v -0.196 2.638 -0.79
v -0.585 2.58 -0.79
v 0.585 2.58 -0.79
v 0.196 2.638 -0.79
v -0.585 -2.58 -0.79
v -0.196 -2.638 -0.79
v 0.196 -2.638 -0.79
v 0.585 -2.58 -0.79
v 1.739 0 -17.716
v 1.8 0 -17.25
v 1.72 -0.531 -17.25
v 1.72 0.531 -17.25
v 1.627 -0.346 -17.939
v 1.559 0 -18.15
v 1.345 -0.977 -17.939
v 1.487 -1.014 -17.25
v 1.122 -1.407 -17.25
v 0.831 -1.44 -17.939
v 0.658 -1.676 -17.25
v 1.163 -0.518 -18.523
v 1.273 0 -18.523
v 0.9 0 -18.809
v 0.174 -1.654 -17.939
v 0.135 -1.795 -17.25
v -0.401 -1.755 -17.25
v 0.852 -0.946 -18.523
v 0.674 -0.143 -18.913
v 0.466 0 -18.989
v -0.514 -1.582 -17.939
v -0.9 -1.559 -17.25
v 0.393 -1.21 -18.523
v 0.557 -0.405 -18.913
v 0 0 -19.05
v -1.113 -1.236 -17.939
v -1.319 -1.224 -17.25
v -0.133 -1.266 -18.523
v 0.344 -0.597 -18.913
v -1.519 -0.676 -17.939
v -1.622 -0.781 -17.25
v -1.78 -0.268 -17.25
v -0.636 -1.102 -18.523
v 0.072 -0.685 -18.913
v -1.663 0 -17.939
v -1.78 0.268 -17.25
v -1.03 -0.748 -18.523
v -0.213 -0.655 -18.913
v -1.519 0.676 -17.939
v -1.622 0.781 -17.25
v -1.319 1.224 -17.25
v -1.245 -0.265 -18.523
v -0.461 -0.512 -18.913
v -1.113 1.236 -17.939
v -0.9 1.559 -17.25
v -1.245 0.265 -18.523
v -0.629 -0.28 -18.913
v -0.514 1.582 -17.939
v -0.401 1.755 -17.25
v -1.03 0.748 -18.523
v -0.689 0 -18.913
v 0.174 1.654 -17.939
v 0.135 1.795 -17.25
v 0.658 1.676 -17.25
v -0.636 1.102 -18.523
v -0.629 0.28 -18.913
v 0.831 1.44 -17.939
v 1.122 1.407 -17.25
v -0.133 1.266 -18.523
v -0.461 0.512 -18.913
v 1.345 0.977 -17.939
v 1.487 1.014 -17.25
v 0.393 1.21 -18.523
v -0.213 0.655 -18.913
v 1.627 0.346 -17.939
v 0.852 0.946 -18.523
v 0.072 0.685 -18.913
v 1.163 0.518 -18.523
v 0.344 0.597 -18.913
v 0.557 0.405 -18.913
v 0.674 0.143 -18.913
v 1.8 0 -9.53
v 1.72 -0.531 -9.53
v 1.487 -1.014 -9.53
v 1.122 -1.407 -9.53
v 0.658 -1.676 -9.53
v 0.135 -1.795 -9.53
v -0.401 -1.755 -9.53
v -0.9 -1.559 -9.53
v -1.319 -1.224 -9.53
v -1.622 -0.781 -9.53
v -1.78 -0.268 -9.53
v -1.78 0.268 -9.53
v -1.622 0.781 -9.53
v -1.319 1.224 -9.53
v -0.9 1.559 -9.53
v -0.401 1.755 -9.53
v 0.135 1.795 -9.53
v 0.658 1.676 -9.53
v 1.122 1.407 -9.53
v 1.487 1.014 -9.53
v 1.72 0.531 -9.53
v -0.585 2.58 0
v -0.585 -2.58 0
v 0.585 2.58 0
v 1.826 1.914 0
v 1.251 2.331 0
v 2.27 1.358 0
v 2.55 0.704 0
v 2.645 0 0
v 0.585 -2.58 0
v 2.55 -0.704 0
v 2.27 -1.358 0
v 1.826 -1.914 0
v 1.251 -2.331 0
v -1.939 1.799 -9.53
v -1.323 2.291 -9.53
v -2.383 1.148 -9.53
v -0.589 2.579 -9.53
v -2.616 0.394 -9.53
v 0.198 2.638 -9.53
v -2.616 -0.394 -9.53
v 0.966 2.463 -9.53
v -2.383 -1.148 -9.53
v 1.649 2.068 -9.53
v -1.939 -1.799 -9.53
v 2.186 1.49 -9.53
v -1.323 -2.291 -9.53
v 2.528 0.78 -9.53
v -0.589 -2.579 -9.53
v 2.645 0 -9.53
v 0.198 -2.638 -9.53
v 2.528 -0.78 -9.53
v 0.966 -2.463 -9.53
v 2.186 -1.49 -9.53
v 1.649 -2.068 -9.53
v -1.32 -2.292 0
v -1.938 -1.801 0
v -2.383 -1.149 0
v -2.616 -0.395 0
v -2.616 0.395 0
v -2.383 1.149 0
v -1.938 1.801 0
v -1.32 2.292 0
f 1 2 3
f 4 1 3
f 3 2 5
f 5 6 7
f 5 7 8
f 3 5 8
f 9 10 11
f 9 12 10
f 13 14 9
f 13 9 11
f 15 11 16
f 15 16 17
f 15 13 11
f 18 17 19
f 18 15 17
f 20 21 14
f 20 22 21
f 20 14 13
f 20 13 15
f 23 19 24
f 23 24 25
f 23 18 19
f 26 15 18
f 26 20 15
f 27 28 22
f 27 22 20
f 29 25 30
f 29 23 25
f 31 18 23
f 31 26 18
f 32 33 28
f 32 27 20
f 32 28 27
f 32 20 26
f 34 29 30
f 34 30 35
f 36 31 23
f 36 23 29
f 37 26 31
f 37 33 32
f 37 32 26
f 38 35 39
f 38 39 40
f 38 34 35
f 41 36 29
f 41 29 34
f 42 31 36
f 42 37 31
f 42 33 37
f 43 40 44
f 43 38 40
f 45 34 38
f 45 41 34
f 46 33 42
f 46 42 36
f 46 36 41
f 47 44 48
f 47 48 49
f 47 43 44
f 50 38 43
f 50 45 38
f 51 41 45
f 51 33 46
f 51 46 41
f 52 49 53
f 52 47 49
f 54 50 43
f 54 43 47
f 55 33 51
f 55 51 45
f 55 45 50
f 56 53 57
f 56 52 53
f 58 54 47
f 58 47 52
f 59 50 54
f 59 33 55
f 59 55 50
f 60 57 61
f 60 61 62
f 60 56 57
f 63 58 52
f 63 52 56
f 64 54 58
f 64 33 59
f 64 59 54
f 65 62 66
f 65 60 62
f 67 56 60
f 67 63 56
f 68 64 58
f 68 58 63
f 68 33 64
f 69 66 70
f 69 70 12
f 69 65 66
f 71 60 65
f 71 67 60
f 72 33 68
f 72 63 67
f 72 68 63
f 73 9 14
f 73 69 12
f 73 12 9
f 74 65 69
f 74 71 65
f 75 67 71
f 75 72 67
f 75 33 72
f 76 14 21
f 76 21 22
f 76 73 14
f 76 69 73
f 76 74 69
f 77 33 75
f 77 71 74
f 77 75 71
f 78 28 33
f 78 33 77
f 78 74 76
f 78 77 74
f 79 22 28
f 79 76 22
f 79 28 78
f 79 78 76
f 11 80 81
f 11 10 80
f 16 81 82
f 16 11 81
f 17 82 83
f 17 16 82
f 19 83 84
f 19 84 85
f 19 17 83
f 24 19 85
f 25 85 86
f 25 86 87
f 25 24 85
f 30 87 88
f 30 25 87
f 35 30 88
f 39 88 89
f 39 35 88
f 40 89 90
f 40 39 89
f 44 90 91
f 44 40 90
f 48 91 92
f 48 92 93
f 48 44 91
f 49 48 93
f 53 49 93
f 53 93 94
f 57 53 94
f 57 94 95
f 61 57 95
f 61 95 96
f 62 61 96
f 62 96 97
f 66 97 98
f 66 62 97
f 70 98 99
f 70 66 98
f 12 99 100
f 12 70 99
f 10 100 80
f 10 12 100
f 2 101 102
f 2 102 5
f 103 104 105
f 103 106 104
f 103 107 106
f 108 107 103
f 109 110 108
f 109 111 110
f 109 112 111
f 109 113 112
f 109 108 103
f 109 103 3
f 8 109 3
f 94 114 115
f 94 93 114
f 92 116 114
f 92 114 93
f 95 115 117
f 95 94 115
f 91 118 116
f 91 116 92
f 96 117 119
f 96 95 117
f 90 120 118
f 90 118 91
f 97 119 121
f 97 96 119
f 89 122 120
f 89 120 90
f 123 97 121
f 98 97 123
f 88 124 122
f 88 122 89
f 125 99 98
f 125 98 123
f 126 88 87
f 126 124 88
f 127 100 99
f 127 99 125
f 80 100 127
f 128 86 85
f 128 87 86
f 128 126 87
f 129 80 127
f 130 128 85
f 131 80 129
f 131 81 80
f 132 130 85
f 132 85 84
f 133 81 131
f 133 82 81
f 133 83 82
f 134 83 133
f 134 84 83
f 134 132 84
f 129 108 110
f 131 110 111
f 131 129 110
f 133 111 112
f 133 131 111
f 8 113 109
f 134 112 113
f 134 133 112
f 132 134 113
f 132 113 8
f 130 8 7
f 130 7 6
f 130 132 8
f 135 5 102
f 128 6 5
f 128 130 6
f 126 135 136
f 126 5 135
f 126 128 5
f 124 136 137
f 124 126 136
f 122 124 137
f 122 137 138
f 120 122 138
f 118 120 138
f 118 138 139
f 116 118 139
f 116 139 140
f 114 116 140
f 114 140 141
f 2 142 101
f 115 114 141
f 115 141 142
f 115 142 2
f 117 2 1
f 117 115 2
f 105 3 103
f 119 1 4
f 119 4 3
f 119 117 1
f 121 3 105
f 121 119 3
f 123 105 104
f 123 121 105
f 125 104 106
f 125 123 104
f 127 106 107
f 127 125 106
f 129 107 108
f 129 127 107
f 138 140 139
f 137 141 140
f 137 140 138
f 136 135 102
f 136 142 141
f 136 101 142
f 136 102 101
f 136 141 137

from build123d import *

# Parameters (mm, degrees)
CUT_EXTRUDE2_DEPTH      = 20.413875706
CUT_EXTRUDE2_DEPTH_BACK = 20.413875706
SKETCH2_W               = 1.17
SKETCH2_H               = 0.79


with BuildPart() as part:
    # Sketch1 → Revolve1 (revolve)
    with BuildSketch(Plane(origin=(0, 0, 0), x_dir=(1, 0, 0), z_dir=(0, 1, 0))):
        with BuildLine():
            Line((0, 0), (2.645379929, 0))
            Line((2.645379929, 0), (2.645379929, 9.53))
            Line((2.645379929, 9.53), (1.8, 9.53))
            Line((1.8, 9.53), (1.8, 17.25))
            ThreePointArc((1.8, 17.25), (1.272792206, 18.522792206), (0, 19.05))
            Line((0, 19.05), (0, 0))
        make_face()
    revolve(axis=Axis((0, 0, 0), (0, 0, -1)))

    # Sketch2 → Cut-Extrude2 (cut, two sides: drawn at the far end of the back side and taken through both)
    with BuildSketch(Plane(origin=(0, 0, 0), x_dir=(1, 0, 0), z_dir=(0, 1, 0)).offset(-CUT_EXTRUDE2_DEPTH_BACK)):
        with Locations((0, 0.395)):
            Rectangle(SKETCH2_W, SKETCH2_H)
    extrude(amount=CUT_EXTRUDE2_DEPTH + CUT_EXTRUDE2_DEPTH_BACK, mode=Mode.SUBTRACT)


solid = part.part
